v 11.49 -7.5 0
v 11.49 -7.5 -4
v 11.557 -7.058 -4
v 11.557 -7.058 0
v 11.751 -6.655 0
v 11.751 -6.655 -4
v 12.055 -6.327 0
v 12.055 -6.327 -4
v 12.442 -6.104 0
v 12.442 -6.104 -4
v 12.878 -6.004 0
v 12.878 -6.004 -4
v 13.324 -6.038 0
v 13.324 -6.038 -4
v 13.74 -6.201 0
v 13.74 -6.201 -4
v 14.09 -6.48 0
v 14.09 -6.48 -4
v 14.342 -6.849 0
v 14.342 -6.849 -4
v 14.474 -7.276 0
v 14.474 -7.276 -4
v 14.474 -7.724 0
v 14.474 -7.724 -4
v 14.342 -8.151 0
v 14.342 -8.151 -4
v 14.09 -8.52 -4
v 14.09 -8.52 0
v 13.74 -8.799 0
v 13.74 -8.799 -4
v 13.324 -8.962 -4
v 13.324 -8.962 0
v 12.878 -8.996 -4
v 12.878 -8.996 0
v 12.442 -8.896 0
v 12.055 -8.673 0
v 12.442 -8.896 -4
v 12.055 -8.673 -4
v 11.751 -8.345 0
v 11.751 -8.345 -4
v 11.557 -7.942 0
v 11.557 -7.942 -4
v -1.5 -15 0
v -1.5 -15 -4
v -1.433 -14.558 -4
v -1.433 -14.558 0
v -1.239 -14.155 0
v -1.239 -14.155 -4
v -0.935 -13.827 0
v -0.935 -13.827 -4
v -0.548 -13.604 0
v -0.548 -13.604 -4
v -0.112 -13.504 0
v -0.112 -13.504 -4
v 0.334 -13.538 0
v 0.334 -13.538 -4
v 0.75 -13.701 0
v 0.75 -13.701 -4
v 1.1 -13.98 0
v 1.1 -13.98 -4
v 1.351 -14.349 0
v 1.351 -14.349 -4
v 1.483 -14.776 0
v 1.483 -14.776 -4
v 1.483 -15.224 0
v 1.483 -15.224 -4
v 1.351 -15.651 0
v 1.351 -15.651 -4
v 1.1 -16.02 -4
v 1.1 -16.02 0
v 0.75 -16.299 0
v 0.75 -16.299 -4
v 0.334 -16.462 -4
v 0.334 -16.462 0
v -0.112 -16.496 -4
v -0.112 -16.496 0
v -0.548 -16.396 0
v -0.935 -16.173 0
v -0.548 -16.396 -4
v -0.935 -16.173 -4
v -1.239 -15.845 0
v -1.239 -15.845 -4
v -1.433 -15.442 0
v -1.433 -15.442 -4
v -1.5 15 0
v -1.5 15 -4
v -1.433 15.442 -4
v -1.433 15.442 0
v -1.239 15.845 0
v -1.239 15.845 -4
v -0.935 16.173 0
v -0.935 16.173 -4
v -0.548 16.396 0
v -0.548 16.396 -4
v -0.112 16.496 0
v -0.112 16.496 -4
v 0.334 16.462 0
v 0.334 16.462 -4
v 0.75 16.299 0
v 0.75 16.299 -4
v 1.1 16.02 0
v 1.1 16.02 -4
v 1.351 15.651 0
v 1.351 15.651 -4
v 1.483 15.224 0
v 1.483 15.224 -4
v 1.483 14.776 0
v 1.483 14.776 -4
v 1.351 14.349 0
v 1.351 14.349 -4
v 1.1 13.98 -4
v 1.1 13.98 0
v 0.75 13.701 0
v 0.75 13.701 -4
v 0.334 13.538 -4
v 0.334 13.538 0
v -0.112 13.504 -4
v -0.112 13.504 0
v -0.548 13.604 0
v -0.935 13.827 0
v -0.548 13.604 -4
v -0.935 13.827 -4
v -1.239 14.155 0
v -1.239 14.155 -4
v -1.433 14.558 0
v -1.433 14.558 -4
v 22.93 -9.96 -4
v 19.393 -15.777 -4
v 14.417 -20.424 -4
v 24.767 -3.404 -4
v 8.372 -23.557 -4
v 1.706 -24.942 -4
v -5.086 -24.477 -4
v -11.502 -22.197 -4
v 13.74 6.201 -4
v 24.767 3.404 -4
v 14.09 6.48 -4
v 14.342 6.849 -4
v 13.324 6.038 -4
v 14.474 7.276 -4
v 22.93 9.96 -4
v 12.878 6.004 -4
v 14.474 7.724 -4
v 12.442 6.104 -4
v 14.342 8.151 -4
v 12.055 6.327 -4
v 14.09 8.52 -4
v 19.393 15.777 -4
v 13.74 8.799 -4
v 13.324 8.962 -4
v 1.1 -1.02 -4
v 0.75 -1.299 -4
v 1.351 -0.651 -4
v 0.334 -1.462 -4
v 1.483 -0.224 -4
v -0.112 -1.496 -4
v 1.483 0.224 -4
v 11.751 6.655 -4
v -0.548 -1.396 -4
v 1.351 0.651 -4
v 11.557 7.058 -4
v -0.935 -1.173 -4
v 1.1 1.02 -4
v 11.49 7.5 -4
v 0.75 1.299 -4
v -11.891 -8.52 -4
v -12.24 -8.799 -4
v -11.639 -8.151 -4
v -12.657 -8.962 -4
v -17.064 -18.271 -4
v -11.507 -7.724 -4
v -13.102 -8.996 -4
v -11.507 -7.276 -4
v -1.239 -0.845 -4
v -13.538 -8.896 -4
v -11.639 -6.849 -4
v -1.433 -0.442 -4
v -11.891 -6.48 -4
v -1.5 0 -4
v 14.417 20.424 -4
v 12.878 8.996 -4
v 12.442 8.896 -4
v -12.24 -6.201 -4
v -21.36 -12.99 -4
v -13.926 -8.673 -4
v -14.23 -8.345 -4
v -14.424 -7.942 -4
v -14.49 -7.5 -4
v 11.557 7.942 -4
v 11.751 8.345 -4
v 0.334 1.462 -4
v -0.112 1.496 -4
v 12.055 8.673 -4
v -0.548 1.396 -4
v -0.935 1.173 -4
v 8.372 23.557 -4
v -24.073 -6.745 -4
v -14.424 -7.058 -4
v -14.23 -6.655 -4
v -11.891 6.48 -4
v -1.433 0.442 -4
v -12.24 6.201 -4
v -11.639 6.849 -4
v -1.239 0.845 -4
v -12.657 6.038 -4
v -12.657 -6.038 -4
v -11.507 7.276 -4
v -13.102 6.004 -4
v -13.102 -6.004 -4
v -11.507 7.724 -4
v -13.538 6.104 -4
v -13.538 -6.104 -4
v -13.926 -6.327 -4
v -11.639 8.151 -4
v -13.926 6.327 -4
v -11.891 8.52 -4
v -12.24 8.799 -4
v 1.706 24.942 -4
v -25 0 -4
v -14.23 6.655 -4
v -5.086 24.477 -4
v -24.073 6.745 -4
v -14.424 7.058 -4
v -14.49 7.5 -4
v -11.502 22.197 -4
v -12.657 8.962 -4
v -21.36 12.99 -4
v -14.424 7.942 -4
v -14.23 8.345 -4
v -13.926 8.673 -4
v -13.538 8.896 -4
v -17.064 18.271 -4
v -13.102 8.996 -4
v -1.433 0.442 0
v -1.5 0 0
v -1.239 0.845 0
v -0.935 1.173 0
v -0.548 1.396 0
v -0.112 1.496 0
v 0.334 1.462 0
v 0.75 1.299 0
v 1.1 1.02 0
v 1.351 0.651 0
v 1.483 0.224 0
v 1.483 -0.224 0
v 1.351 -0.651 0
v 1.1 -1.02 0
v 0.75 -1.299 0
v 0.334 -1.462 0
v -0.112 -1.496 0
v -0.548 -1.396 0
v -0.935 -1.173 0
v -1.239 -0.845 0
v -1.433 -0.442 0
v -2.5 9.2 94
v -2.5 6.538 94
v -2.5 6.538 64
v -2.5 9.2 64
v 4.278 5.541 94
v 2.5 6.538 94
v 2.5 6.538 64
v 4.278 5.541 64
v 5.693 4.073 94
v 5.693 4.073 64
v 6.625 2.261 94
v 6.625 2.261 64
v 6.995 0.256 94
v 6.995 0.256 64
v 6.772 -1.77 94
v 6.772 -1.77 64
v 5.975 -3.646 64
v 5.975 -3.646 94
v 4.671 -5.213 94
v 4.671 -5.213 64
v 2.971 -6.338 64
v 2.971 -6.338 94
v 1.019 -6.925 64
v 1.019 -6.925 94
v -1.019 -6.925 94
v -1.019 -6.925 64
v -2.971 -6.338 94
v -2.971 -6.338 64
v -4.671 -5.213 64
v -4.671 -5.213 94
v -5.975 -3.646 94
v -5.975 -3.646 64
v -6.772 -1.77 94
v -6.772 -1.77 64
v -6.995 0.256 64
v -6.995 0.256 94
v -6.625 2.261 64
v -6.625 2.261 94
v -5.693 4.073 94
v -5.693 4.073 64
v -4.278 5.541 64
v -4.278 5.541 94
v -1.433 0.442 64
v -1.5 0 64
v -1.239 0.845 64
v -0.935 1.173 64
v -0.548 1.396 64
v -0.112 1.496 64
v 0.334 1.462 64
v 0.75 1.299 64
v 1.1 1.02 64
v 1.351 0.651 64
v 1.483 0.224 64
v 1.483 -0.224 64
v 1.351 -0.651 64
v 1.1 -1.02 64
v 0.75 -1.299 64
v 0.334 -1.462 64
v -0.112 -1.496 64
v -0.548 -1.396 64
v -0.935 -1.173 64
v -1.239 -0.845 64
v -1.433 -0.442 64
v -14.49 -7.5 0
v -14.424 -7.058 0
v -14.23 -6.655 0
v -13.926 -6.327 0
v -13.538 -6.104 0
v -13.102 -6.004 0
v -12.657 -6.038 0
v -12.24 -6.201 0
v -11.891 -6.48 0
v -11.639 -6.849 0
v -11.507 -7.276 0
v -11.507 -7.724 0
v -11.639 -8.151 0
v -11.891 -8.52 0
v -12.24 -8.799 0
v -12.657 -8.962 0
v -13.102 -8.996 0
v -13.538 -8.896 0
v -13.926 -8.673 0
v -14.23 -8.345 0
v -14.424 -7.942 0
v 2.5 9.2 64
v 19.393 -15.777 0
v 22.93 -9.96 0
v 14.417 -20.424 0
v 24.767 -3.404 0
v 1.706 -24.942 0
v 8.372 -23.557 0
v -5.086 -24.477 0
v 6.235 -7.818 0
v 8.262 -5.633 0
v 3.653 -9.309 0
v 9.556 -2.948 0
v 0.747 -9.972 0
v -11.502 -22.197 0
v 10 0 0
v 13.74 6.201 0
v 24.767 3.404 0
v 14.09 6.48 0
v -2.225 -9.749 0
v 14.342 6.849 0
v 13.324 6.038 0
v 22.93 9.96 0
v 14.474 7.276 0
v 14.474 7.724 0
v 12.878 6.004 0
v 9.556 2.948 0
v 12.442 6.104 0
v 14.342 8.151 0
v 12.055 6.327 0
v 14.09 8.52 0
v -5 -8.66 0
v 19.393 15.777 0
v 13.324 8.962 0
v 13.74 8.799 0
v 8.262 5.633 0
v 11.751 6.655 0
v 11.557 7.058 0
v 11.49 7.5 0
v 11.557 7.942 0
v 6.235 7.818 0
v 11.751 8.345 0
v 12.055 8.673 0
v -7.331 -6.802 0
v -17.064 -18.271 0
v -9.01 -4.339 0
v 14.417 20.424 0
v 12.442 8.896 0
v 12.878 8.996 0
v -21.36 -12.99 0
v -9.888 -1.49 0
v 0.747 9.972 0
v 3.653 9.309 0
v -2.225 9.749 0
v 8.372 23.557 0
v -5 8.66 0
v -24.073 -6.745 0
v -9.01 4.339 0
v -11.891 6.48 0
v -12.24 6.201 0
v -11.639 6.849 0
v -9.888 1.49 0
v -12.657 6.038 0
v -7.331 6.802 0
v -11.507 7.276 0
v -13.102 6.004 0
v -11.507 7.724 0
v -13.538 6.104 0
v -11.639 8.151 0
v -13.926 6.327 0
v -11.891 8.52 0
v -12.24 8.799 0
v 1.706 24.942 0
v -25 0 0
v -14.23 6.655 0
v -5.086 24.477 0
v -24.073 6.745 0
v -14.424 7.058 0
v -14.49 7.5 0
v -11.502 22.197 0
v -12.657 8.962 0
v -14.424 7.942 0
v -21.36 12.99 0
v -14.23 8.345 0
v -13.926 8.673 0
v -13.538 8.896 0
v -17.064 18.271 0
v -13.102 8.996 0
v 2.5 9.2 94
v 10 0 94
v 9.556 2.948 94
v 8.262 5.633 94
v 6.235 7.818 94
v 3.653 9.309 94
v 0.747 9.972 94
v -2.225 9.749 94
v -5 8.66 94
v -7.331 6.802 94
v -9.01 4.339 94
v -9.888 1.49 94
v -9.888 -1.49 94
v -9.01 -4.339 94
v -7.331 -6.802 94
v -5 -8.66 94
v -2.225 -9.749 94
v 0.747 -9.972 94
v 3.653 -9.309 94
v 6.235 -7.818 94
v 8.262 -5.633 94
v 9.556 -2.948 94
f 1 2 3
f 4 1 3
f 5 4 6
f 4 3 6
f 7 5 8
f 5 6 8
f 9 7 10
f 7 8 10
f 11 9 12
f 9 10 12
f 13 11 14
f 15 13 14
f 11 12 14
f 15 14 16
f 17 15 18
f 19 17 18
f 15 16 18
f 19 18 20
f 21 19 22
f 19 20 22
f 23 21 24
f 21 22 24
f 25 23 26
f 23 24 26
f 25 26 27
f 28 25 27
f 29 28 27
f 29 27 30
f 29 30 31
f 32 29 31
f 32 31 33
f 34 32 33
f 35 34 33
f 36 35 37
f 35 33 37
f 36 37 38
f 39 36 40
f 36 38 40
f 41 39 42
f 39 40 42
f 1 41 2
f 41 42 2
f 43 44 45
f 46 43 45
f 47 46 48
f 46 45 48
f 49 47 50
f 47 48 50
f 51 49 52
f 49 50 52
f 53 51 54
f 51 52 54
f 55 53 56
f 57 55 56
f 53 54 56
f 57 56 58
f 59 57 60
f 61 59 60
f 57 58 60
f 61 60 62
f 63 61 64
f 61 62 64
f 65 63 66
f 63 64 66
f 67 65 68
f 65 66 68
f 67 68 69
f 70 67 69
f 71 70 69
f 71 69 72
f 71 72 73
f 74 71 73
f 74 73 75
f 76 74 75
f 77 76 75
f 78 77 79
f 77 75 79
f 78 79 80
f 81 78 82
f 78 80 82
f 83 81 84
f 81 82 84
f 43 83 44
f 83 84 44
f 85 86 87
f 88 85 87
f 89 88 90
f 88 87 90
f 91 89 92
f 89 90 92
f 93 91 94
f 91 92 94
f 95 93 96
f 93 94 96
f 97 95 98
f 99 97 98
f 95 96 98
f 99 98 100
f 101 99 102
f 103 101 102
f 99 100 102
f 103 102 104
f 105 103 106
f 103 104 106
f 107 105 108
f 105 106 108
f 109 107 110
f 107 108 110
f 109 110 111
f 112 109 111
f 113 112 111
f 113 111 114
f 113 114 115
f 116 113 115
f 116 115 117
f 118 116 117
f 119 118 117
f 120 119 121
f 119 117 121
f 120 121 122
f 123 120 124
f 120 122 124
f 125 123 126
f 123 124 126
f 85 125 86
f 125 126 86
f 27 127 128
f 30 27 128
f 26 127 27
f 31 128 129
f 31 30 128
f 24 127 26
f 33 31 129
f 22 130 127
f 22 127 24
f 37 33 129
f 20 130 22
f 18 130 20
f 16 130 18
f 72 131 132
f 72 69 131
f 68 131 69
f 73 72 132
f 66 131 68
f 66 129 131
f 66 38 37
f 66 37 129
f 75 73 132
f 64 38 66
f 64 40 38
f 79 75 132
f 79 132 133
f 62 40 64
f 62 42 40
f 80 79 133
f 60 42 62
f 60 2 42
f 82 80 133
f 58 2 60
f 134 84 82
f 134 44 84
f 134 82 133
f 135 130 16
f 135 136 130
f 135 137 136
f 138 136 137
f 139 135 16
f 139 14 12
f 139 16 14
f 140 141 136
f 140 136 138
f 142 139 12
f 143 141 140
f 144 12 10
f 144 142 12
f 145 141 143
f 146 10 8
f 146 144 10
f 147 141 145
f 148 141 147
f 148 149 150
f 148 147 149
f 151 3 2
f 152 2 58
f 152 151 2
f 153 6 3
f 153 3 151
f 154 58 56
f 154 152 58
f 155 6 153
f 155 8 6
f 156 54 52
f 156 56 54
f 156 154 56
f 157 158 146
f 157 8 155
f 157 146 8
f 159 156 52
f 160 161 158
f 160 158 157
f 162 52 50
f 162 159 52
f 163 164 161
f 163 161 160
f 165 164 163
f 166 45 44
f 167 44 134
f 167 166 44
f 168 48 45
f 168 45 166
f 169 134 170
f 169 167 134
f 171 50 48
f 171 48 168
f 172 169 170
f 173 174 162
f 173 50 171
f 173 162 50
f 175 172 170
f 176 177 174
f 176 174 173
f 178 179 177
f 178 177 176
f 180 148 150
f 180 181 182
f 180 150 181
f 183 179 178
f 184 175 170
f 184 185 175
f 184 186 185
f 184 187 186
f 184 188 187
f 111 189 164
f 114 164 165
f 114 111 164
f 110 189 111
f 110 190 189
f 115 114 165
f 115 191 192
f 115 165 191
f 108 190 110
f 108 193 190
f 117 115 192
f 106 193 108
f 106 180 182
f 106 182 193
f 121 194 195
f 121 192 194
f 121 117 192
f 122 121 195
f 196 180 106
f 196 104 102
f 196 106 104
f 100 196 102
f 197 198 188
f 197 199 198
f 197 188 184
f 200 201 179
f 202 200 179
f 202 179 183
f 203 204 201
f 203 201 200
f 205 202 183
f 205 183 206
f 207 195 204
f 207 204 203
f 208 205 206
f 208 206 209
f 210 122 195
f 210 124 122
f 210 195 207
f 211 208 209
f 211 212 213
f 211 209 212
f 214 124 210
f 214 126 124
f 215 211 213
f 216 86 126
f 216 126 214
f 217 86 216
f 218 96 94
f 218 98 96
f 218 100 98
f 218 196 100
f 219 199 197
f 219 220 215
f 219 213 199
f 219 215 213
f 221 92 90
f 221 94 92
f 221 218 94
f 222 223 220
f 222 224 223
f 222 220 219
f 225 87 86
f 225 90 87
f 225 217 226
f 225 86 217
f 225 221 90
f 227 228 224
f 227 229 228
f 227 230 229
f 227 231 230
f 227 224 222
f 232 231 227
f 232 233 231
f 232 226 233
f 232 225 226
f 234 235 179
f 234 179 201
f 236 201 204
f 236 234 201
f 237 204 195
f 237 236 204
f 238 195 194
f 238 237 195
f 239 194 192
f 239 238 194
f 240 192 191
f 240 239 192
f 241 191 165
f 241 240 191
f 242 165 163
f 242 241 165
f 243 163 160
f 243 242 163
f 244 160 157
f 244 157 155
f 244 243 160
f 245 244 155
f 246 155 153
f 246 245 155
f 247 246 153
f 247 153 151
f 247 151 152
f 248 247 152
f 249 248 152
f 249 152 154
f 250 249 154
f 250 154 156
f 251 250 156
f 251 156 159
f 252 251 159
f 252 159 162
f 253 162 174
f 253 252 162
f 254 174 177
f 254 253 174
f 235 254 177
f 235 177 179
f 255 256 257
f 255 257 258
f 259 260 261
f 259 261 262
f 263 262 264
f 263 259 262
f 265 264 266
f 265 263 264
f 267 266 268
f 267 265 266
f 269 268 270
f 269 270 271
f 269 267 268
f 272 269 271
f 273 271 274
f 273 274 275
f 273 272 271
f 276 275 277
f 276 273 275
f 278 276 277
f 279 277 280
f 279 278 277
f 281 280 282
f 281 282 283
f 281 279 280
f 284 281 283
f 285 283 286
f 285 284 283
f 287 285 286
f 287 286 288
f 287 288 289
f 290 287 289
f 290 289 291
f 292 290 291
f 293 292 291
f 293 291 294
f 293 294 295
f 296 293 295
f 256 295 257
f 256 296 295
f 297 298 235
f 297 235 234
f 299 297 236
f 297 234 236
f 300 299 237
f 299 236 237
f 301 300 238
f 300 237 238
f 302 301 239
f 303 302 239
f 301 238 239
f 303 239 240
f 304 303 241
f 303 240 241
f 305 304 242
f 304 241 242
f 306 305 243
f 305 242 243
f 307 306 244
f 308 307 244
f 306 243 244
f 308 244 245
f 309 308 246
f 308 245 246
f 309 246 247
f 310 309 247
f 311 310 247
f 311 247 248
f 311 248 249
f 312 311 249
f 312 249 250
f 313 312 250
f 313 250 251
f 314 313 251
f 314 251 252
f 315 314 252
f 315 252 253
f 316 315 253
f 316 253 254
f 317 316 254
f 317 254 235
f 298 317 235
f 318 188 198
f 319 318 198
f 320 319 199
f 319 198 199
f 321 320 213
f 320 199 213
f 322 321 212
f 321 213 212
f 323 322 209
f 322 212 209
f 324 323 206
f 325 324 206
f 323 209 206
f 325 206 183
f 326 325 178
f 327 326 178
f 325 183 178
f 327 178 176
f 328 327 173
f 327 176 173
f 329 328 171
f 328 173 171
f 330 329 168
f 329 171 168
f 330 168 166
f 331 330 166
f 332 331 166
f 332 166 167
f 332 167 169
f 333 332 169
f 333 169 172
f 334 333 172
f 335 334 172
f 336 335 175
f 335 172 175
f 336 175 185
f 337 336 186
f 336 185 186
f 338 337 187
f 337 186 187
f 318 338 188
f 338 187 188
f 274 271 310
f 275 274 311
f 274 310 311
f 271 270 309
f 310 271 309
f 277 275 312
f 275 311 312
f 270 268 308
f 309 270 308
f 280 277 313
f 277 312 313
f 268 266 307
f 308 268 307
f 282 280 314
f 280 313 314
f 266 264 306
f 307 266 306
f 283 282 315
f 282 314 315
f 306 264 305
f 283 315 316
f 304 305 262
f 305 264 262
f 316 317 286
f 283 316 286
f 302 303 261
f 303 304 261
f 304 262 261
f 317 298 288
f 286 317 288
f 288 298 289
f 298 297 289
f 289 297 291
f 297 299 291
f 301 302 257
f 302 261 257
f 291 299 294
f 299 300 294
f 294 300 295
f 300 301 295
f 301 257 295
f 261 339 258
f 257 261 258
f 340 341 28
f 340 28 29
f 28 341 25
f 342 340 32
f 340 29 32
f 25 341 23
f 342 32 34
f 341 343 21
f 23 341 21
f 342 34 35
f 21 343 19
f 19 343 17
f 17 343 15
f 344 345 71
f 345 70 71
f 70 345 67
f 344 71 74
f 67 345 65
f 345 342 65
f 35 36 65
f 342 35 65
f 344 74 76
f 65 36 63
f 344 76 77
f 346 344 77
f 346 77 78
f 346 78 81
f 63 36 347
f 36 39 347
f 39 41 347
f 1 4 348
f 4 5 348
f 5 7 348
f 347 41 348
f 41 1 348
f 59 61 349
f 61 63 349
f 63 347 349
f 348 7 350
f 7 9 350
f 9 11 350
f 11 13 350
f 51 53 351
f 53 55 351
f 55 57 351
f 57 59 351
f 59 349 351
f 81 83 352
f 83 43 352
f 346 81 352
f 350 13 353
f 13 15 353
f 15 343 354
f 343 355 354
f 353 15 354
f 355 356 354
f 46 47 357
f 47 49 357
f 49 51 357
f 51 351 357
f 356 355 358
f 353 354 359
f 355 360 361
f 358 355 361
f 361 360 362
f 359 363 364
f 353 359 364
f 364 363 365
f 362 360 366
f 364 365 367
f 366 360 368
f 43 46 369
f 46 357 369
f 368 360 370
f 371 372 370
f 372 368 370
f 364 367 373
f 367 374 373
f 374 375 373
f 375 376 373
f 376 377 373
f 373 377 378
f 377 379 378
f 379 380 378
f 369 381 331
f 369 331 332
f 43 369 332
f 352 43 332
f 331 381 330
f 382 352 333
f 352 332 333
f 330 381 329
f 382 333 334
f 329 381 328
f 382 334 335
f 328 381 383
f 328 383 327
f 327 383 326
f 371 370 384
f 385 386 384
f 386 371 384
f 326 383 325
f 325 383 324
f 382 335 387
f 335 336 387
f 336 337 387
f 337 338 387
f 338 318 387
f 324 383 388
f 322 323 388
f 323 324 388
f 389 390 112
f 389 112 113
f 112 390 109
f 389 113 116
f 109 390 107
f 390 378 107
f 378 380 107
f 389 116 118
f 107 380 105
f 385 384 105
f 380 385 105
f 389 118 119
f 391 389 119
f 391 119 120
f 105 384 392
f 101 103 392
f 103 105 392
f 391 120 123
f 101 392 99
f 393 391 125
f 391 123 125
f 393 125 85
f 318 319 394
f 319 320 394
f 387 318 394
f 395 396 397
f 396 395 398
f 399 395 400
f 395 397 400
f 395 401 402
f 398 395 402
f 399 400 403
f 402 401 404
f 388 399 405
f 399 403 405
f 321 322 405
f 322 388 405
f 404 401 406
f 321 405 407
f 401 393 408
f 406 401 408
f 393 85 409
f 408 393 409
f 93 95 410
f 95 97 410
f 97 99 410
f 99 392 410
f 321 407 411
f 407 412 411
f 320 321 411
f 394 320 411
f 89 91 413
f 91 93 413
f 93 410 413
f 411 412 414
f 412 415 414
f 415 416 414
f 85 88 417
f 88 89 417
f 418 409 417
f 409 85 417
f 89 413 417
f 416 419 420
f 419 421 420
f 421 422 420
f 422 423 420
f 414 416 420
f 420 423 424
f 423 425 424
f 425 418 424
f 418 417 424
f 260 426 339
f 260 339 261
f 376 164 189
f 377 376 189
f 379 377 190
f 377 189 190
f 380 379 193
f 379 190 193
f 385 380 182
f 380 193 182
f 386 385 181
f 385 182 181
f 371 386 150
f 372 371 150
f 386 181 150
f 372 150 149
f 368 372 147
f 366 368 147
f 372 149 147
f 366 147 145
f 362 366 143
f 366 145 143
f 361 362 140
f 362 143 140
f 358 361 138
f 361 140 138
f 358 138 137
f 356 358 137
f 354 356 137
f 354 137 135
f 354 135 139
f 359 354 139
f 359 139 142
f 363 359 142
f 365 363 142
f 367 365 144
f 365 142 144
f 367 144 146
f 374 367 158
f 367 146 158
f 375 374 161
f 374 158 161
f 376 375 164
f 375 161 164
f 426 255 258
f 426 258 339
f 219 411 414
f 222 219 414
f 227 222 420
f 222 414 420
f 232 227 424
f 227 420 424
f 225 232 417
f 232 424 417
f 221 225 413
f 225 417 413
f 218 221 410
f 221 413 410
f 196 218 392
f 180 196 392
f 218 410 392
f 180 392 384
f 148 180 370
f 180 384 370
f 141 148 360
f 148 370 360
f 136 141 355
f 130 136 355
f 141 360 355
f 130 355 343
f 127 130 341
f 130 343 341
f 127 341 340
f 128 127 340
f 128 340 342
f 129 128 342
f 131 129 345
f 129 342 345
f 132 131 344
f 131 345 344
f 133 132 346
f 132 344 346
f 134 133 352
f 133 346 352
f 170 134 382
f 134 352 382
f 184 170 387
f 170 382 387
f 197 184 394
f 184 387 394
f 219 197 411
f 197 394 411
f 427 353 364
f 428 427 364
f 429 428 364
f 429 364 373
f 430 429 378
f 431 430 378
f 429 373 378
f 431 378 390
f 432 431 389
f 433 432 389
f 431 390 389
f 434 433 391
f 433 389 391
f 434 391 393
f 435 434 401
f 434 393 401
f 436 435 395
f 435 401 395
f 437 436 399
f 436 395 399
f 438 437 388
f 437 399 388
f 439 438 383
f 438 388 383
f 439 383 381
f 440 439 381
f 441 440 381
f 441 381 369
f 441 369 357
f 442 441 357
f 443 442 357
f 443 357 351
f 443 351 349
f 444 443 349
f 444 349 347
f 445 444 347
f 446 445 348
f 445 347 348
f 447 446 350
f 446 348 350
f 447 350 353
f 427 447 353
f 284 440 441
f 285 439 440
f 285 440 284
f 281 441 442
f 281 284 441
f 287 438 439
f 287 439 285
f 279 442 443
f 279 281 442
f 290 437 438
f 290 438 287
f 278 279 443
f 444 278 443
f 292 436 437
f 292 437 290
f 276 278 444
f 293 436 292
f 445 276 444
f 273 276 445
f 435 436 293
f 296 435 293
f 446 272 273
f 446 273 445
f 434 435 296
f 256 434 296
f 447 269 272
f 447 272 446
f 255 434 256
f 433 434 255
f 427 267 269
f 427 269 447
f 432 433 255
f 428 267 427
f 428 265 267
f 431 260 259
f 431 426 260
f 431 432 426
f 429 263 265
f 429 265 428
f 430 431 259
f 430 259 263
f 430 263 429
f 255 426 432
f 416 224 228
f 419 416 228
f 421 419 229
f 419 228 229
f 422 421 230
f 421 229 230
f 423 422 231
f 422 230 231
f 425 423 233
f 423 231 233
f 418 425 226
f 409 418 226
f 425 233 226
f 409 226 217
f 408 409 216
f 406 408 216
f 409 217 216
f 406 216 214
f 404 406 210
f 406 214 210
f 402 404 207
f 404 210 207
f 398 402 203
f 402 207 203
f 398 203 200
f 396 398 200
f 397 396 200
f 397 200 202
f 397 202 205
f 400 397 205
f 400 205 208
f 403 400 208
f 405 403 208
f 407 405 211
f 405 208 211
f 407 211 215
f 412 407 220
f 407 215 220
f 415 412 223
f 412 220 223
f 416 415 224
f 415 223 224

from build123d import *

# Parameters (mm, degrees)
SKETCH_1_R          = 10
EXTRUDE_1_DEPTH     = 94
CUT_EXTRUDE_1_DEPTH = 30
SKETCH_3_R          = 1.5
CUT_EXTRUDE_2_DEPTH = 95
SKETCH_4_R          = 25
SKETCH_4_R_2        = 1.5
EXTRUDE_2_DEPTH     = 4
SKETCH_5_R          = 1.5
CUT_EXTRUDE_5_DEPTH = 4


with BuildPart() as part:
    # 草图1 → 凸台-拉伸1 (new body)
    with BuildSketch(Plane.XY):
        Circle(SKETCH_1_R)
    extrude(amount=EXTRUDE_1_DEPTH)

    # 草图2 → 切除-拉伸1 (cut)
    with BuildSketch(Plane.XY.offset(94)):
        with BuildLine():
            Line((-2.5, 6.538348415), (-2.5, 9.2))
            Line((-2.5, 9.2), (2.5, 9.2))
            Line((2.5, 9.2), (2.5, 6.538348415))
            ThreePointArc((2.5, 6.538348415), (0, -7), (-2.5, 6.538348415))
        make_face()
    extrude(amount=-CUT_EXTRUDE_1_DEPTH, mode=Mode.SUBTRACT)

    # 草图3 → 切除-拉伸2 (cut, through all)
    with BuildSketch(Plane(origin=(0, 0, 0), x_dir=(-1, 0, 0), z_dir=(0, 0, -1))):
        Circle(SKETCH_3_R)
    extrude(amount=-CUT_EXTRUDE_2_DEPTH, mode=Mode.SUBTRACT)

    # 草图4 → 凸台-拉伸2 (add)
    with BuildSketch(Plane(origin=(0, 0, 0), x_dir=(-1, 0, 0), z_dir=(0, 0, -1))):
        Circle(SKETCH_4_R)
        Circle(SKETCH_4_R_2, mode=Mode.SUBTRACT)
    extrude(amount=EXTRUDE_2_DEPTH)

    # 草图5 → 切除-拉伸5 (cut)
    with BuildSketch(Plane(origin=(0, 0, -4), x_dir=(-1, 0, 0), z_dir=(0, 0, -1))):
        with Locations((0, 15)):
            Circle(SKETCH_5_R)
        with Locations((12.990381057, 7.5)):
            Circle(SKETCH_5_R)
        with Locations((12.990381057, -7.5)):
            Circle(SKETCH_5_R)
        with Locations((0, -15)):
            Circle(SKETCH_5_R)
        with Locations((-12.990381057, -7.5)):
            Circle(SKETCH_5_R)
        with Locations((-12.990381057, 7.5)):
            Circle(SKETCH_5_R)
    extrude(amount=-CUT_EXTRUDE_5_DEPTH, mode=Mode.SUBTRACT)


solid = part.part
